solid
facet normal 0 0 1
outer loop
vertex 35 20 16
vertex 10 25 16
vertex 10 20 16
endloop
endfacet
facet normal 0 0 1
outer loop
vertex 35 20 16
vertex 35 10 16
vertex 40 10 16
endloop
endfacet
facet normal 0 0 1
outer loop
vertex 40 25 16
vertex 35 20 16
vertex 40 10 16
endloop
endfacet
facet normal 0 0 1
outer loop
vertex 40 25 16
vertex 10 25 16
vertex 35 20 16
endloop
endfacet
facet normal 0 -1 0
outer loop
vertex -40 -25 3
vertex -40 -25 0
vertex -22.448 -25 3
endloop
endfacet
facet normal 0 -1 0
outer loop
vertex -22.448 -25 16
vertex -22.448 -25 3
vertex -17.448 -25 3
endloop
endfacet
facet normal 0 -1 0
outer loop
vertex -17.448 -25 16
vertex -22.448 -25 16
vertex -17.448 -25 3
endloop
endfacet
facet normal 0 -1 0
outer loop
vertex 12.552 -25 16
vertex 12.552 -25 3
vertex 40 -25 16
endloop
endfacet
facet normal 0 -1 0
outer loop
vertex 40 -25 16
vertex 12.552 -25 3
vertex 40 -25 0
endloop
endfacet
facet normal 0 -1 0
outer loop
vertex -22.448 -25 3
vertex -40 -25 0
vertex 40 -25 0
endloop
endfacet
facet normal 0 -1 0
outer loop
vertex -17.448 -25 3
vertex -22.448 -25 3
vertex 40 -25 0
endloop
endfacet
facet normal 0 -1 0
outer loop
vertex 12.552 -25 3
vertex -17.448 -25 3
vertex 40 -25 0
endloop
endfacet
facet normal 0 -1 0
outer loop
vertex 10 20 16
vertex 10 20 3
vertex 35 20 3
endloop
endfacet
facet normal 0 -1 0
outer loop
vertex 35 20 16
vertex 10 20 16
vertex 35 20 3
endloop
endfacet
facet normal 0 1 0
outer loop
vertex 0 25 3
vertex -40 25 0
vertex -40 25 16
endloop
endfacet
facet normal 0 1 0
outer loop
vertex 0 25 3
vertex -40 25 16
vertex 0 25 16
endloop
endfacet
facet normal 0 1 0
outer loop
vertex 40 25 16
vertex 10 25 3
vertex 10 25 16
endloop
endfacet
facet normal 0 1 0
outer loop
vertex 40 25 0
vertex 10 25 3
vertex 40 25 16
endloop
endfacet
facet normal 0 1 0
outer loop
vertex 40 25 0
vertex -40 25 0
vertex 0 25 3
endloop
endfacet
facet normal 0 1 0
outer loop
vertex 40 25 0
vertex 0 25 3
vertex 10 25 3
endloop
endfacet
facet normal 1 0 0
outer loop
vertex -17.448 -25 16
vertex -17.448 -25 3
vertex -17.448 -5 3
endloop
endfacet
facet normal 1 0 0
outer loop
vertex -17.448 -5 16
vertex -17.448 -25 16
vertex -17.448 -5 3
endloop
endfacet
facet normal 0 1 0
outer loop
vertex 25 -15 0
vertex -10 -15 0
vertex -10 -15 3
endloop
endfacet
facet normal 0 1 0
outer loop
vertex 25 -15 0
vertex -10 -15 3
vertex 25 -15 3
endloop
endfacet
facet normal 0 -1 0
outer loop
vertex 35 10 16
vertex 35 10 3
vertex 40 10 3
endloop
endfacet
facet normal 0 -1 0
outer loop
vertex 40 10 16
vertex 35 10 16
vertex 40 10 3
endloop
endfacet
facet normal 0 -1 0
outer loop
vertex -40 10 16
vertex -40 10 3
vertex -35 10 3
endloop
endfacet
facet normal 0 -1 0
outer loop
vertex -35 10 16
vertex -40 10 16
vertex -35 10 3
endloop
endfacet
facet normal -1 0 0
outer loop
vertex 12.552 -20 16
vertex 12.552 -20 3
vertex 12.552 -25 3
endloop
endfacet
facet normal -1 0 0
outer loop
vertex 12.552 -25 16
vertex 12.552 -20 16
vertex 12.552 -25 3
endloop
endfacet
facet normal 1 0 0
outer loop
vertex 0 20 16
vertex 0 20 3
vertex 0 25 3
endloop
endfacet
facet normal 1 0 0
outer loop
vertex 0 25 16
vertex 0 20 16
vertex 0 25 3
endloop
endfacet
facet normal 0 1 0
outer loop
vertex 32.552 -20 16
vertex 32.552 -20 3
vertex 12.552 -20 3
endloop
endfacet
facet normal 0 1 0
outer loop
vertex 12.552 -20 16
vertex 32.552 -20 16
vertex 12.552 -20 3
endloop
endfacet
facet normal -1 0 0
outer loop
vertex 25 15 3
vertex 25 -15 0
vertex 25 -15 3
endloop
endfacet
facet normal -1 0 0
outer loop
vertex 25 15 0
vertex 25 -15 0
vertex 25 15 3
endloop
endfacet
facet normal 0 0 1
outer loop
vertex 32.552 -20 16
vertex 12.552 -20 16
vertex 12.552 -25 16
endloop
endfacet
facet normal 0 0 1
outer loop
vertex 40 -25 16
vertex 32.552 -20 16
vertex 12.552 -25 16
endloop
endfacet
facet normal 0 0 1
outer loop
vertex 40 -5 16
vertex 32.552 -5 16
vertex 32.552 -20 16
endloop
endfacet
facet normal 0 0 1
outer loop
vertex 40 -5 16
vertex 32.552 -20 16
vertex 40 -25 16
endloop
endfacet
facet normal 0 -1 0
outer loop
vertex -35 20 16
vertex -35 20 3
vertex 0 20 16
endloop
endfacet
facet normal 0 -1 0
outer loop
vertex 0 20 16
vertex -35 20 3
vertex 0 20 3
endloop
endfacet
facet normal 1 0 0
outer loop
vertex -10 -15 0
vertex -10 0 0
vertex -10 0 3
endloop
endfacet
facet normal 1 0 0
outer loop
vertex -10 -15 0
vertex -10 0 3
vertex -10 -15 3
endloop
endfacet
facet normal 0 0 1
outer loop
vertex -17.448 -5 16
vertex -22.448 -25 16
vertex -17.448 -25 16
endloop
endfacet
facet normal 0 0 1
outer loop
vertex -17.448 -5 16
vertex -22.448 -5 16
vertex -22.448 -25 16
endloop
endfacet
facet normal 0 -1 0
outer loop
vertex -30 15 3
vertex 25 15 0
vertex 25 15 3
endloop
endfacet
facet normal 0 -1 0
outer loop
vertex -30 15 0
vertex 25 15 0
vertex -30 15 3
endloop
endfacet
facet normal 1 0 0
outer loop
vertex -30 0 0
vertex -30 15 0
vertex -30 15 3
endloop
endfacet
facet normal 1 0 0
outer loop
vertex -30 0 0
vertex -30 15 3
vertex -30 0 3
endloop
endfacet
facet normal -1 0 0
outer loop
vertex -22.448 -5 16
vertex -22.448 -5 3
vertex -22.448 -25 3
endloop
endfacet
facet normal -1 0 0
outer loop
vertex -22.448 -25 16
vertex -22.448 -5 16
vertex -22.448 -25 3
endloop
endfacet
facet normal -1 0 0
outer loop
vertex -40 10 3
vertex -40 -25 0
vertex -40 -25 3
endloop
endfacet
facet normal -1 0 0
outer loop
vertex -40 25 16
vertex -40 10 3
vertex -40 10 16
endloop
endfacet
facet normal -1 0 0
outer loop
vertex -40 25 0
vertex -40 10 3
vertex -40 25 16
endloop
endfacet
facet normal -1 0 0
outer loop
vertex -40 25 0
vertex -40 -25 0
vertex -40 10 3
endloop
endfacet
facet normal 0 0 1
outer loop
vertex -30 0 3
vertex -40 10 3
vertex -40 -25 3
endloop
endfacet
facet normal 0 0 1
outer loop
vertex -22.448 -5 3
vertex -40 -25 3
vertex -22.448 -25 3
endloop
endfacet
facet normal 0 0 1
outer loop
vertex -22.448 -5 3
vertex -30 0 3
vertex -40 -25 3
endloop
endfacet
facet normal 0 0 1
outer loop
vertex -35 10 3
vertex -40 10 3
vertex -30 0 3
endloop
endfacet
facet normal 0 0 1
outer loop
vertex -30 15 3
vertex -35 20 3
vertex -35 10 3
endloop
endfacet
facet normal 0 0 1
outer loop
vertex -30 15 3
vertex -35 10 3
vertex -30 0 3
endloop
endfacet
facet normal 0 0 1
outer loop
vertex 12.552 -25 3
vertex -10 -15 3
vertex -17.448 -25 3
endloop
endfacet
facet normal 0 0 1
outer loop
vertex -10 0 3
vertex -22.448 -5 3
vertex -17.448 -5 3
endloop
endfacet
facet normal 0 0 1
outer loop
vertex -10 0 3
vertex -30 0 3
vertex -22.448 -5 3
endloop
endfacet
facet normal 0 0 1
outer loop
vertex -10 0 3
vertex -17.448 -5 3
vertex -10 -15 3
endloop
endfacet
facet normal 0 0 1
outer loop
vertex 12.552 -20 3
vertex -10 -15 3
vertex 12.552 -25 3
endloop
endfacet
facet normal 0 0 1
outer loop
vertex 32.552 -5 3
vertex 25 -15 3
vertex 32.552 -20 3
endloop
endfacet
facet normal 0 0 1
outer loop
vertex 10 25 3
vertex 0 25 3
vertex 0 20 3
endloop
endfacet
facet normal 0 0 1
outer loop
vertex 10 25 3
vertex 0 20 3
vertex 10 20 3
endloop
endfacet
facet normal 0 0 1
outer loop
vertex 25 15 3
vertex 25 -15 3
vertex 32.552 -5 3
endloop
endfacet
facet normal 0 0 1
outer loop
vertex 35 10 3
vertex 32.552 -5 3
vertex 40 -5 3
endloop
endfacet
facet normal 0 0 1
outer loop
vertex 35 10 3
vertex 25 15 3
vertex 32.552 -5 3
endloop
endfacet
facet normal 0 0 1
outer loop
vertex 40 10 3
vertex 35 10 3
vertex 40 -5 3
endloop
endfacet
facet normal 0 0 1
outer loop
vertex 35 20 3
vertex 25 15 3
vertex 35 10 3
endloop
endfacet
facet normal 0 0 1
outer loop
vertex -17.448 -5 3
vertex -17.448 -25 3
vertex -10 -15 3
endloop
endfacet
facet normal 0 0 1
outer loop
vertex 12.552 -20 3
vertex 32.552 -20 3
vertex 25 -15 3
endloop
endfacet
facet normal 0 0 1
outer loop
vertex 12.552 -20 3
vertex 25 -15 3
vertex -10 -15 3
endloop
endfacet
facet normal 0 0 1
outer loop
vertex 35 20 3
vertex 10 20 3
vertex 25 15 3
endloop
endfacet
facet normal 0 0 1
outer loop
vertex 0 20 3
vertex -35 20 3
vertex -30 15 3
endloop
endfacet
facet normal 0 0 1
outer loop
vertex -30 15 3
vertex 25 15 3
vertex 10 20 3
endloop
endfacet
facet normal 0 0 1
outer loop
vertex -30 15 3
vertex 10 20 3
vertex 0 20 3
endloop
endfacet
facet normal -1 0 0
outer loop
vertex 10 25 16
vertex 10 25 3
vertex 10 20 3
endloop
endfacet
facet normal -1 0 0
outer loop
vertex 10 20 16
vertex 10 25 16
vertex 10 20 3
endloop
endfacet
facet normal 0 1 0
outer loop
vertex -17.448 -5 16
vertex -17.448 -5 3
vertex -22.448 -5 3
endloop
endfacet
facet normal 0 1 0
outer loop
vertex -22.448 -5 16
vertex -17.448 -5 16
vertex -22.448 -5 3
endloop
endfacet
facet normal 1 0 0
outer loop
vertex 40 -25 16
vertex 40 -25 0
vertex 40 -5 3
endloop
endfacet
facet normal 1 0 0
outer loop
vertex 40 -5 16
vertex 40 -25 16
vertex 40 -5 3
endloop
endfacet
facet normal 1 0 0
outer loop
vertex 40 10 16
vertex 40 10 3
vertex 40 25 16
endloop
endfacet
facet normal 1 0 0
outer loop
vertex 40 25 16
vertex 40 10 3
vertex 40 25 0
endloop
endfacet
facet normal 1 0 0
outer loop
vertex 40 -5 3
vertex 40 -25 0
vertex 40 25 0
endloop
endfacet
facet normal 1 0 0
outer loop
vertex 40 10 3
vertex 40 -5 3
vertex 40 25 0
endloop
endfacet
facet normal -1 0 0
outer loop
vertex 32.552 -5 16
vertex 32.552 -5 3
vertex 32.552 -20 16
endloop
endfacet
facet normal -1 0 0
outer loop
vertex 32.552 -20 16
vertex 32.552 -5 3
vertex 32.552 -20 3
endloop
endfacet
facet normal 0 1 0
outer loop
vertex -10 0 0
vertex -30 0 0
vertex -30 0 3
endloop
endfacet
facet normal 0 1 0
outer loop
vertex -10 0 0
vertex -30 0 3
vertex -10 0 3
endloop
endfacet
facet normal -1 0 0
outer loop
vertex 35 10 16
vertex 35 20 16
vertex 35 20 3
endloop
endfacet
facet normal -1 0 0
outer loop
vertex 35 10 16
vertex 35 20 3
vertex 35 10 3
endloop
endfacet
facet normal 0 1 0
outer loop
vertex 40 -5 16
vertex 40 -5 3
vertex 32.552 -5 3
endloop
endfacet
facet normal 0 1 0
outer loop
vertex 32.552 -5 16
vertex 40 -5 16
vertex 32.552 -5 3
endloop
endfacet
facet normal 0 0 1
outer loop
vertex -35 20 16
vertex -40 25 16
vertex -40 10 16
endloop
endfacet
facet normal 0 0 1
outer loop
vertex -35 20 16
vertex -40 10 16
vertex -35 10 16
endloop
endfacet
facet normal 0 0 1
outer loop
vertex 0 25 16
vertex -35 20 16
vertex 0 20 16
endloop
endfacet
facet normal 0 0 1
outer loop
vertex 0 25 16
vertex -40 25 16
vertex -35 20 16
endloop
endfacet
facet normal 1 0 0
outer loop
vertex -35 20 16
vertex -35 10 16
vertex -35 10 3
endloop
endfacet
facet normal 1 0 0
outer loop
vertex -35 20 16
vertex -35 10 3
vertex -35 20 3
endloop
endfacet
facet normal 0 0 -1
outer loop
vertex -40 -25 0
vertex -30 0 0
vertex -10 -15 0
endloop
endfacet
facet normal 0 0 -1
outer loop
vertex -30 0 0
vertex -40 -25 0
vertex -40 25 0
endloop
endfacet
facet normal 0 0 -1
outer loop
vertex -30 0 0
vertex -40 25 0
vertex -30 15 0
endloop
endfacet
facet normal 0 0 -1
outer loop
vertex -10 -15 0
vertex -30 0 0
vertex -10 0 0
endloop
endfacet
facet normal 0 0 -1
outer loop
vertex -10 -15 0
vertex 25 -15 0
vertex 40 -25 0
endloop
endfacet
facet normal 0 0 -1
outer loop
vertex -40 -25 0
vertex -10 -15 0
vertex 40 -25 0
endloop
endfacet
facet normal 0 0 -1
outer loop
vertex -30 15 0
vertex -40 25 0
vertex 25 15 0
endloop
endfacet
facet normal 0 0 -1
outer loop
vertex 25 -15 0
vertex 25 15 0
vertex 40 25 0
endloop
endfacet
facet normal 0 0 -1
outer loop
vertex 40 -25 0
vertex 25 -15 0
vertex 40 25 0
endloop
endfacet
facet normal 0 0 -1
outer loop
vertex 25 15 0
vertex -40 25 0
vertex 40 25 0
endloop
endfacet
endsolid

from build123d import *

# Parameters (mm, degrees)
F0_W     = 80
F0_H     = 50
F1_DEPTH = 3
F3_DEPTH = 16
F5_DEPTH = 25


with BuildPart() as f1:
    # F0 (on Top) → F1 (new body)
    with BuildSketch(Plane.XY):
        Rectangle(F0_W, F0_H)
    extrude(amount=F1_DEPTH)

    # F2 (on Top) → F3 (join)
    with BuildSketch(Plane.XY):
        Polygon((-35, 20), (0, 20), (0, 25), (-40, 25), (-40, 10), (-35, 10), align=None)
        Polygon((40, 25), (10, 25), (10, 20), (35, 20), (35, 10), (40, 10), align=None)
        Polygon((40, -25), (40, -5), (32.552384, -5), (32.552384, -20), (12.552384, -20), (12.552384, -25), align=None)
        Polygon((-22.447616, -25), (-17.447616, -25), (-17.447616, -5), (-22.447616, -5), (-22.447616, -20), align=None)
    extrude(amount=F3_DEPTH)


with BuildPart() as f5:
    # F4 (on Top) → F5 (new body)
    with BuildSketch(Plane.XY):
        Polygon((-30, 0), (-10, 0), (-10, -15), (25, -15), (25, 15), (-30, 15), align=None)
    extrude(amount=F5_DEPTH)


with BuildPart() as f1_1:
    add(f1.part)

    # F6: cut F5
    add(f5.part, mode=Mode.SUBTRACT)


solid = f1_1.part
